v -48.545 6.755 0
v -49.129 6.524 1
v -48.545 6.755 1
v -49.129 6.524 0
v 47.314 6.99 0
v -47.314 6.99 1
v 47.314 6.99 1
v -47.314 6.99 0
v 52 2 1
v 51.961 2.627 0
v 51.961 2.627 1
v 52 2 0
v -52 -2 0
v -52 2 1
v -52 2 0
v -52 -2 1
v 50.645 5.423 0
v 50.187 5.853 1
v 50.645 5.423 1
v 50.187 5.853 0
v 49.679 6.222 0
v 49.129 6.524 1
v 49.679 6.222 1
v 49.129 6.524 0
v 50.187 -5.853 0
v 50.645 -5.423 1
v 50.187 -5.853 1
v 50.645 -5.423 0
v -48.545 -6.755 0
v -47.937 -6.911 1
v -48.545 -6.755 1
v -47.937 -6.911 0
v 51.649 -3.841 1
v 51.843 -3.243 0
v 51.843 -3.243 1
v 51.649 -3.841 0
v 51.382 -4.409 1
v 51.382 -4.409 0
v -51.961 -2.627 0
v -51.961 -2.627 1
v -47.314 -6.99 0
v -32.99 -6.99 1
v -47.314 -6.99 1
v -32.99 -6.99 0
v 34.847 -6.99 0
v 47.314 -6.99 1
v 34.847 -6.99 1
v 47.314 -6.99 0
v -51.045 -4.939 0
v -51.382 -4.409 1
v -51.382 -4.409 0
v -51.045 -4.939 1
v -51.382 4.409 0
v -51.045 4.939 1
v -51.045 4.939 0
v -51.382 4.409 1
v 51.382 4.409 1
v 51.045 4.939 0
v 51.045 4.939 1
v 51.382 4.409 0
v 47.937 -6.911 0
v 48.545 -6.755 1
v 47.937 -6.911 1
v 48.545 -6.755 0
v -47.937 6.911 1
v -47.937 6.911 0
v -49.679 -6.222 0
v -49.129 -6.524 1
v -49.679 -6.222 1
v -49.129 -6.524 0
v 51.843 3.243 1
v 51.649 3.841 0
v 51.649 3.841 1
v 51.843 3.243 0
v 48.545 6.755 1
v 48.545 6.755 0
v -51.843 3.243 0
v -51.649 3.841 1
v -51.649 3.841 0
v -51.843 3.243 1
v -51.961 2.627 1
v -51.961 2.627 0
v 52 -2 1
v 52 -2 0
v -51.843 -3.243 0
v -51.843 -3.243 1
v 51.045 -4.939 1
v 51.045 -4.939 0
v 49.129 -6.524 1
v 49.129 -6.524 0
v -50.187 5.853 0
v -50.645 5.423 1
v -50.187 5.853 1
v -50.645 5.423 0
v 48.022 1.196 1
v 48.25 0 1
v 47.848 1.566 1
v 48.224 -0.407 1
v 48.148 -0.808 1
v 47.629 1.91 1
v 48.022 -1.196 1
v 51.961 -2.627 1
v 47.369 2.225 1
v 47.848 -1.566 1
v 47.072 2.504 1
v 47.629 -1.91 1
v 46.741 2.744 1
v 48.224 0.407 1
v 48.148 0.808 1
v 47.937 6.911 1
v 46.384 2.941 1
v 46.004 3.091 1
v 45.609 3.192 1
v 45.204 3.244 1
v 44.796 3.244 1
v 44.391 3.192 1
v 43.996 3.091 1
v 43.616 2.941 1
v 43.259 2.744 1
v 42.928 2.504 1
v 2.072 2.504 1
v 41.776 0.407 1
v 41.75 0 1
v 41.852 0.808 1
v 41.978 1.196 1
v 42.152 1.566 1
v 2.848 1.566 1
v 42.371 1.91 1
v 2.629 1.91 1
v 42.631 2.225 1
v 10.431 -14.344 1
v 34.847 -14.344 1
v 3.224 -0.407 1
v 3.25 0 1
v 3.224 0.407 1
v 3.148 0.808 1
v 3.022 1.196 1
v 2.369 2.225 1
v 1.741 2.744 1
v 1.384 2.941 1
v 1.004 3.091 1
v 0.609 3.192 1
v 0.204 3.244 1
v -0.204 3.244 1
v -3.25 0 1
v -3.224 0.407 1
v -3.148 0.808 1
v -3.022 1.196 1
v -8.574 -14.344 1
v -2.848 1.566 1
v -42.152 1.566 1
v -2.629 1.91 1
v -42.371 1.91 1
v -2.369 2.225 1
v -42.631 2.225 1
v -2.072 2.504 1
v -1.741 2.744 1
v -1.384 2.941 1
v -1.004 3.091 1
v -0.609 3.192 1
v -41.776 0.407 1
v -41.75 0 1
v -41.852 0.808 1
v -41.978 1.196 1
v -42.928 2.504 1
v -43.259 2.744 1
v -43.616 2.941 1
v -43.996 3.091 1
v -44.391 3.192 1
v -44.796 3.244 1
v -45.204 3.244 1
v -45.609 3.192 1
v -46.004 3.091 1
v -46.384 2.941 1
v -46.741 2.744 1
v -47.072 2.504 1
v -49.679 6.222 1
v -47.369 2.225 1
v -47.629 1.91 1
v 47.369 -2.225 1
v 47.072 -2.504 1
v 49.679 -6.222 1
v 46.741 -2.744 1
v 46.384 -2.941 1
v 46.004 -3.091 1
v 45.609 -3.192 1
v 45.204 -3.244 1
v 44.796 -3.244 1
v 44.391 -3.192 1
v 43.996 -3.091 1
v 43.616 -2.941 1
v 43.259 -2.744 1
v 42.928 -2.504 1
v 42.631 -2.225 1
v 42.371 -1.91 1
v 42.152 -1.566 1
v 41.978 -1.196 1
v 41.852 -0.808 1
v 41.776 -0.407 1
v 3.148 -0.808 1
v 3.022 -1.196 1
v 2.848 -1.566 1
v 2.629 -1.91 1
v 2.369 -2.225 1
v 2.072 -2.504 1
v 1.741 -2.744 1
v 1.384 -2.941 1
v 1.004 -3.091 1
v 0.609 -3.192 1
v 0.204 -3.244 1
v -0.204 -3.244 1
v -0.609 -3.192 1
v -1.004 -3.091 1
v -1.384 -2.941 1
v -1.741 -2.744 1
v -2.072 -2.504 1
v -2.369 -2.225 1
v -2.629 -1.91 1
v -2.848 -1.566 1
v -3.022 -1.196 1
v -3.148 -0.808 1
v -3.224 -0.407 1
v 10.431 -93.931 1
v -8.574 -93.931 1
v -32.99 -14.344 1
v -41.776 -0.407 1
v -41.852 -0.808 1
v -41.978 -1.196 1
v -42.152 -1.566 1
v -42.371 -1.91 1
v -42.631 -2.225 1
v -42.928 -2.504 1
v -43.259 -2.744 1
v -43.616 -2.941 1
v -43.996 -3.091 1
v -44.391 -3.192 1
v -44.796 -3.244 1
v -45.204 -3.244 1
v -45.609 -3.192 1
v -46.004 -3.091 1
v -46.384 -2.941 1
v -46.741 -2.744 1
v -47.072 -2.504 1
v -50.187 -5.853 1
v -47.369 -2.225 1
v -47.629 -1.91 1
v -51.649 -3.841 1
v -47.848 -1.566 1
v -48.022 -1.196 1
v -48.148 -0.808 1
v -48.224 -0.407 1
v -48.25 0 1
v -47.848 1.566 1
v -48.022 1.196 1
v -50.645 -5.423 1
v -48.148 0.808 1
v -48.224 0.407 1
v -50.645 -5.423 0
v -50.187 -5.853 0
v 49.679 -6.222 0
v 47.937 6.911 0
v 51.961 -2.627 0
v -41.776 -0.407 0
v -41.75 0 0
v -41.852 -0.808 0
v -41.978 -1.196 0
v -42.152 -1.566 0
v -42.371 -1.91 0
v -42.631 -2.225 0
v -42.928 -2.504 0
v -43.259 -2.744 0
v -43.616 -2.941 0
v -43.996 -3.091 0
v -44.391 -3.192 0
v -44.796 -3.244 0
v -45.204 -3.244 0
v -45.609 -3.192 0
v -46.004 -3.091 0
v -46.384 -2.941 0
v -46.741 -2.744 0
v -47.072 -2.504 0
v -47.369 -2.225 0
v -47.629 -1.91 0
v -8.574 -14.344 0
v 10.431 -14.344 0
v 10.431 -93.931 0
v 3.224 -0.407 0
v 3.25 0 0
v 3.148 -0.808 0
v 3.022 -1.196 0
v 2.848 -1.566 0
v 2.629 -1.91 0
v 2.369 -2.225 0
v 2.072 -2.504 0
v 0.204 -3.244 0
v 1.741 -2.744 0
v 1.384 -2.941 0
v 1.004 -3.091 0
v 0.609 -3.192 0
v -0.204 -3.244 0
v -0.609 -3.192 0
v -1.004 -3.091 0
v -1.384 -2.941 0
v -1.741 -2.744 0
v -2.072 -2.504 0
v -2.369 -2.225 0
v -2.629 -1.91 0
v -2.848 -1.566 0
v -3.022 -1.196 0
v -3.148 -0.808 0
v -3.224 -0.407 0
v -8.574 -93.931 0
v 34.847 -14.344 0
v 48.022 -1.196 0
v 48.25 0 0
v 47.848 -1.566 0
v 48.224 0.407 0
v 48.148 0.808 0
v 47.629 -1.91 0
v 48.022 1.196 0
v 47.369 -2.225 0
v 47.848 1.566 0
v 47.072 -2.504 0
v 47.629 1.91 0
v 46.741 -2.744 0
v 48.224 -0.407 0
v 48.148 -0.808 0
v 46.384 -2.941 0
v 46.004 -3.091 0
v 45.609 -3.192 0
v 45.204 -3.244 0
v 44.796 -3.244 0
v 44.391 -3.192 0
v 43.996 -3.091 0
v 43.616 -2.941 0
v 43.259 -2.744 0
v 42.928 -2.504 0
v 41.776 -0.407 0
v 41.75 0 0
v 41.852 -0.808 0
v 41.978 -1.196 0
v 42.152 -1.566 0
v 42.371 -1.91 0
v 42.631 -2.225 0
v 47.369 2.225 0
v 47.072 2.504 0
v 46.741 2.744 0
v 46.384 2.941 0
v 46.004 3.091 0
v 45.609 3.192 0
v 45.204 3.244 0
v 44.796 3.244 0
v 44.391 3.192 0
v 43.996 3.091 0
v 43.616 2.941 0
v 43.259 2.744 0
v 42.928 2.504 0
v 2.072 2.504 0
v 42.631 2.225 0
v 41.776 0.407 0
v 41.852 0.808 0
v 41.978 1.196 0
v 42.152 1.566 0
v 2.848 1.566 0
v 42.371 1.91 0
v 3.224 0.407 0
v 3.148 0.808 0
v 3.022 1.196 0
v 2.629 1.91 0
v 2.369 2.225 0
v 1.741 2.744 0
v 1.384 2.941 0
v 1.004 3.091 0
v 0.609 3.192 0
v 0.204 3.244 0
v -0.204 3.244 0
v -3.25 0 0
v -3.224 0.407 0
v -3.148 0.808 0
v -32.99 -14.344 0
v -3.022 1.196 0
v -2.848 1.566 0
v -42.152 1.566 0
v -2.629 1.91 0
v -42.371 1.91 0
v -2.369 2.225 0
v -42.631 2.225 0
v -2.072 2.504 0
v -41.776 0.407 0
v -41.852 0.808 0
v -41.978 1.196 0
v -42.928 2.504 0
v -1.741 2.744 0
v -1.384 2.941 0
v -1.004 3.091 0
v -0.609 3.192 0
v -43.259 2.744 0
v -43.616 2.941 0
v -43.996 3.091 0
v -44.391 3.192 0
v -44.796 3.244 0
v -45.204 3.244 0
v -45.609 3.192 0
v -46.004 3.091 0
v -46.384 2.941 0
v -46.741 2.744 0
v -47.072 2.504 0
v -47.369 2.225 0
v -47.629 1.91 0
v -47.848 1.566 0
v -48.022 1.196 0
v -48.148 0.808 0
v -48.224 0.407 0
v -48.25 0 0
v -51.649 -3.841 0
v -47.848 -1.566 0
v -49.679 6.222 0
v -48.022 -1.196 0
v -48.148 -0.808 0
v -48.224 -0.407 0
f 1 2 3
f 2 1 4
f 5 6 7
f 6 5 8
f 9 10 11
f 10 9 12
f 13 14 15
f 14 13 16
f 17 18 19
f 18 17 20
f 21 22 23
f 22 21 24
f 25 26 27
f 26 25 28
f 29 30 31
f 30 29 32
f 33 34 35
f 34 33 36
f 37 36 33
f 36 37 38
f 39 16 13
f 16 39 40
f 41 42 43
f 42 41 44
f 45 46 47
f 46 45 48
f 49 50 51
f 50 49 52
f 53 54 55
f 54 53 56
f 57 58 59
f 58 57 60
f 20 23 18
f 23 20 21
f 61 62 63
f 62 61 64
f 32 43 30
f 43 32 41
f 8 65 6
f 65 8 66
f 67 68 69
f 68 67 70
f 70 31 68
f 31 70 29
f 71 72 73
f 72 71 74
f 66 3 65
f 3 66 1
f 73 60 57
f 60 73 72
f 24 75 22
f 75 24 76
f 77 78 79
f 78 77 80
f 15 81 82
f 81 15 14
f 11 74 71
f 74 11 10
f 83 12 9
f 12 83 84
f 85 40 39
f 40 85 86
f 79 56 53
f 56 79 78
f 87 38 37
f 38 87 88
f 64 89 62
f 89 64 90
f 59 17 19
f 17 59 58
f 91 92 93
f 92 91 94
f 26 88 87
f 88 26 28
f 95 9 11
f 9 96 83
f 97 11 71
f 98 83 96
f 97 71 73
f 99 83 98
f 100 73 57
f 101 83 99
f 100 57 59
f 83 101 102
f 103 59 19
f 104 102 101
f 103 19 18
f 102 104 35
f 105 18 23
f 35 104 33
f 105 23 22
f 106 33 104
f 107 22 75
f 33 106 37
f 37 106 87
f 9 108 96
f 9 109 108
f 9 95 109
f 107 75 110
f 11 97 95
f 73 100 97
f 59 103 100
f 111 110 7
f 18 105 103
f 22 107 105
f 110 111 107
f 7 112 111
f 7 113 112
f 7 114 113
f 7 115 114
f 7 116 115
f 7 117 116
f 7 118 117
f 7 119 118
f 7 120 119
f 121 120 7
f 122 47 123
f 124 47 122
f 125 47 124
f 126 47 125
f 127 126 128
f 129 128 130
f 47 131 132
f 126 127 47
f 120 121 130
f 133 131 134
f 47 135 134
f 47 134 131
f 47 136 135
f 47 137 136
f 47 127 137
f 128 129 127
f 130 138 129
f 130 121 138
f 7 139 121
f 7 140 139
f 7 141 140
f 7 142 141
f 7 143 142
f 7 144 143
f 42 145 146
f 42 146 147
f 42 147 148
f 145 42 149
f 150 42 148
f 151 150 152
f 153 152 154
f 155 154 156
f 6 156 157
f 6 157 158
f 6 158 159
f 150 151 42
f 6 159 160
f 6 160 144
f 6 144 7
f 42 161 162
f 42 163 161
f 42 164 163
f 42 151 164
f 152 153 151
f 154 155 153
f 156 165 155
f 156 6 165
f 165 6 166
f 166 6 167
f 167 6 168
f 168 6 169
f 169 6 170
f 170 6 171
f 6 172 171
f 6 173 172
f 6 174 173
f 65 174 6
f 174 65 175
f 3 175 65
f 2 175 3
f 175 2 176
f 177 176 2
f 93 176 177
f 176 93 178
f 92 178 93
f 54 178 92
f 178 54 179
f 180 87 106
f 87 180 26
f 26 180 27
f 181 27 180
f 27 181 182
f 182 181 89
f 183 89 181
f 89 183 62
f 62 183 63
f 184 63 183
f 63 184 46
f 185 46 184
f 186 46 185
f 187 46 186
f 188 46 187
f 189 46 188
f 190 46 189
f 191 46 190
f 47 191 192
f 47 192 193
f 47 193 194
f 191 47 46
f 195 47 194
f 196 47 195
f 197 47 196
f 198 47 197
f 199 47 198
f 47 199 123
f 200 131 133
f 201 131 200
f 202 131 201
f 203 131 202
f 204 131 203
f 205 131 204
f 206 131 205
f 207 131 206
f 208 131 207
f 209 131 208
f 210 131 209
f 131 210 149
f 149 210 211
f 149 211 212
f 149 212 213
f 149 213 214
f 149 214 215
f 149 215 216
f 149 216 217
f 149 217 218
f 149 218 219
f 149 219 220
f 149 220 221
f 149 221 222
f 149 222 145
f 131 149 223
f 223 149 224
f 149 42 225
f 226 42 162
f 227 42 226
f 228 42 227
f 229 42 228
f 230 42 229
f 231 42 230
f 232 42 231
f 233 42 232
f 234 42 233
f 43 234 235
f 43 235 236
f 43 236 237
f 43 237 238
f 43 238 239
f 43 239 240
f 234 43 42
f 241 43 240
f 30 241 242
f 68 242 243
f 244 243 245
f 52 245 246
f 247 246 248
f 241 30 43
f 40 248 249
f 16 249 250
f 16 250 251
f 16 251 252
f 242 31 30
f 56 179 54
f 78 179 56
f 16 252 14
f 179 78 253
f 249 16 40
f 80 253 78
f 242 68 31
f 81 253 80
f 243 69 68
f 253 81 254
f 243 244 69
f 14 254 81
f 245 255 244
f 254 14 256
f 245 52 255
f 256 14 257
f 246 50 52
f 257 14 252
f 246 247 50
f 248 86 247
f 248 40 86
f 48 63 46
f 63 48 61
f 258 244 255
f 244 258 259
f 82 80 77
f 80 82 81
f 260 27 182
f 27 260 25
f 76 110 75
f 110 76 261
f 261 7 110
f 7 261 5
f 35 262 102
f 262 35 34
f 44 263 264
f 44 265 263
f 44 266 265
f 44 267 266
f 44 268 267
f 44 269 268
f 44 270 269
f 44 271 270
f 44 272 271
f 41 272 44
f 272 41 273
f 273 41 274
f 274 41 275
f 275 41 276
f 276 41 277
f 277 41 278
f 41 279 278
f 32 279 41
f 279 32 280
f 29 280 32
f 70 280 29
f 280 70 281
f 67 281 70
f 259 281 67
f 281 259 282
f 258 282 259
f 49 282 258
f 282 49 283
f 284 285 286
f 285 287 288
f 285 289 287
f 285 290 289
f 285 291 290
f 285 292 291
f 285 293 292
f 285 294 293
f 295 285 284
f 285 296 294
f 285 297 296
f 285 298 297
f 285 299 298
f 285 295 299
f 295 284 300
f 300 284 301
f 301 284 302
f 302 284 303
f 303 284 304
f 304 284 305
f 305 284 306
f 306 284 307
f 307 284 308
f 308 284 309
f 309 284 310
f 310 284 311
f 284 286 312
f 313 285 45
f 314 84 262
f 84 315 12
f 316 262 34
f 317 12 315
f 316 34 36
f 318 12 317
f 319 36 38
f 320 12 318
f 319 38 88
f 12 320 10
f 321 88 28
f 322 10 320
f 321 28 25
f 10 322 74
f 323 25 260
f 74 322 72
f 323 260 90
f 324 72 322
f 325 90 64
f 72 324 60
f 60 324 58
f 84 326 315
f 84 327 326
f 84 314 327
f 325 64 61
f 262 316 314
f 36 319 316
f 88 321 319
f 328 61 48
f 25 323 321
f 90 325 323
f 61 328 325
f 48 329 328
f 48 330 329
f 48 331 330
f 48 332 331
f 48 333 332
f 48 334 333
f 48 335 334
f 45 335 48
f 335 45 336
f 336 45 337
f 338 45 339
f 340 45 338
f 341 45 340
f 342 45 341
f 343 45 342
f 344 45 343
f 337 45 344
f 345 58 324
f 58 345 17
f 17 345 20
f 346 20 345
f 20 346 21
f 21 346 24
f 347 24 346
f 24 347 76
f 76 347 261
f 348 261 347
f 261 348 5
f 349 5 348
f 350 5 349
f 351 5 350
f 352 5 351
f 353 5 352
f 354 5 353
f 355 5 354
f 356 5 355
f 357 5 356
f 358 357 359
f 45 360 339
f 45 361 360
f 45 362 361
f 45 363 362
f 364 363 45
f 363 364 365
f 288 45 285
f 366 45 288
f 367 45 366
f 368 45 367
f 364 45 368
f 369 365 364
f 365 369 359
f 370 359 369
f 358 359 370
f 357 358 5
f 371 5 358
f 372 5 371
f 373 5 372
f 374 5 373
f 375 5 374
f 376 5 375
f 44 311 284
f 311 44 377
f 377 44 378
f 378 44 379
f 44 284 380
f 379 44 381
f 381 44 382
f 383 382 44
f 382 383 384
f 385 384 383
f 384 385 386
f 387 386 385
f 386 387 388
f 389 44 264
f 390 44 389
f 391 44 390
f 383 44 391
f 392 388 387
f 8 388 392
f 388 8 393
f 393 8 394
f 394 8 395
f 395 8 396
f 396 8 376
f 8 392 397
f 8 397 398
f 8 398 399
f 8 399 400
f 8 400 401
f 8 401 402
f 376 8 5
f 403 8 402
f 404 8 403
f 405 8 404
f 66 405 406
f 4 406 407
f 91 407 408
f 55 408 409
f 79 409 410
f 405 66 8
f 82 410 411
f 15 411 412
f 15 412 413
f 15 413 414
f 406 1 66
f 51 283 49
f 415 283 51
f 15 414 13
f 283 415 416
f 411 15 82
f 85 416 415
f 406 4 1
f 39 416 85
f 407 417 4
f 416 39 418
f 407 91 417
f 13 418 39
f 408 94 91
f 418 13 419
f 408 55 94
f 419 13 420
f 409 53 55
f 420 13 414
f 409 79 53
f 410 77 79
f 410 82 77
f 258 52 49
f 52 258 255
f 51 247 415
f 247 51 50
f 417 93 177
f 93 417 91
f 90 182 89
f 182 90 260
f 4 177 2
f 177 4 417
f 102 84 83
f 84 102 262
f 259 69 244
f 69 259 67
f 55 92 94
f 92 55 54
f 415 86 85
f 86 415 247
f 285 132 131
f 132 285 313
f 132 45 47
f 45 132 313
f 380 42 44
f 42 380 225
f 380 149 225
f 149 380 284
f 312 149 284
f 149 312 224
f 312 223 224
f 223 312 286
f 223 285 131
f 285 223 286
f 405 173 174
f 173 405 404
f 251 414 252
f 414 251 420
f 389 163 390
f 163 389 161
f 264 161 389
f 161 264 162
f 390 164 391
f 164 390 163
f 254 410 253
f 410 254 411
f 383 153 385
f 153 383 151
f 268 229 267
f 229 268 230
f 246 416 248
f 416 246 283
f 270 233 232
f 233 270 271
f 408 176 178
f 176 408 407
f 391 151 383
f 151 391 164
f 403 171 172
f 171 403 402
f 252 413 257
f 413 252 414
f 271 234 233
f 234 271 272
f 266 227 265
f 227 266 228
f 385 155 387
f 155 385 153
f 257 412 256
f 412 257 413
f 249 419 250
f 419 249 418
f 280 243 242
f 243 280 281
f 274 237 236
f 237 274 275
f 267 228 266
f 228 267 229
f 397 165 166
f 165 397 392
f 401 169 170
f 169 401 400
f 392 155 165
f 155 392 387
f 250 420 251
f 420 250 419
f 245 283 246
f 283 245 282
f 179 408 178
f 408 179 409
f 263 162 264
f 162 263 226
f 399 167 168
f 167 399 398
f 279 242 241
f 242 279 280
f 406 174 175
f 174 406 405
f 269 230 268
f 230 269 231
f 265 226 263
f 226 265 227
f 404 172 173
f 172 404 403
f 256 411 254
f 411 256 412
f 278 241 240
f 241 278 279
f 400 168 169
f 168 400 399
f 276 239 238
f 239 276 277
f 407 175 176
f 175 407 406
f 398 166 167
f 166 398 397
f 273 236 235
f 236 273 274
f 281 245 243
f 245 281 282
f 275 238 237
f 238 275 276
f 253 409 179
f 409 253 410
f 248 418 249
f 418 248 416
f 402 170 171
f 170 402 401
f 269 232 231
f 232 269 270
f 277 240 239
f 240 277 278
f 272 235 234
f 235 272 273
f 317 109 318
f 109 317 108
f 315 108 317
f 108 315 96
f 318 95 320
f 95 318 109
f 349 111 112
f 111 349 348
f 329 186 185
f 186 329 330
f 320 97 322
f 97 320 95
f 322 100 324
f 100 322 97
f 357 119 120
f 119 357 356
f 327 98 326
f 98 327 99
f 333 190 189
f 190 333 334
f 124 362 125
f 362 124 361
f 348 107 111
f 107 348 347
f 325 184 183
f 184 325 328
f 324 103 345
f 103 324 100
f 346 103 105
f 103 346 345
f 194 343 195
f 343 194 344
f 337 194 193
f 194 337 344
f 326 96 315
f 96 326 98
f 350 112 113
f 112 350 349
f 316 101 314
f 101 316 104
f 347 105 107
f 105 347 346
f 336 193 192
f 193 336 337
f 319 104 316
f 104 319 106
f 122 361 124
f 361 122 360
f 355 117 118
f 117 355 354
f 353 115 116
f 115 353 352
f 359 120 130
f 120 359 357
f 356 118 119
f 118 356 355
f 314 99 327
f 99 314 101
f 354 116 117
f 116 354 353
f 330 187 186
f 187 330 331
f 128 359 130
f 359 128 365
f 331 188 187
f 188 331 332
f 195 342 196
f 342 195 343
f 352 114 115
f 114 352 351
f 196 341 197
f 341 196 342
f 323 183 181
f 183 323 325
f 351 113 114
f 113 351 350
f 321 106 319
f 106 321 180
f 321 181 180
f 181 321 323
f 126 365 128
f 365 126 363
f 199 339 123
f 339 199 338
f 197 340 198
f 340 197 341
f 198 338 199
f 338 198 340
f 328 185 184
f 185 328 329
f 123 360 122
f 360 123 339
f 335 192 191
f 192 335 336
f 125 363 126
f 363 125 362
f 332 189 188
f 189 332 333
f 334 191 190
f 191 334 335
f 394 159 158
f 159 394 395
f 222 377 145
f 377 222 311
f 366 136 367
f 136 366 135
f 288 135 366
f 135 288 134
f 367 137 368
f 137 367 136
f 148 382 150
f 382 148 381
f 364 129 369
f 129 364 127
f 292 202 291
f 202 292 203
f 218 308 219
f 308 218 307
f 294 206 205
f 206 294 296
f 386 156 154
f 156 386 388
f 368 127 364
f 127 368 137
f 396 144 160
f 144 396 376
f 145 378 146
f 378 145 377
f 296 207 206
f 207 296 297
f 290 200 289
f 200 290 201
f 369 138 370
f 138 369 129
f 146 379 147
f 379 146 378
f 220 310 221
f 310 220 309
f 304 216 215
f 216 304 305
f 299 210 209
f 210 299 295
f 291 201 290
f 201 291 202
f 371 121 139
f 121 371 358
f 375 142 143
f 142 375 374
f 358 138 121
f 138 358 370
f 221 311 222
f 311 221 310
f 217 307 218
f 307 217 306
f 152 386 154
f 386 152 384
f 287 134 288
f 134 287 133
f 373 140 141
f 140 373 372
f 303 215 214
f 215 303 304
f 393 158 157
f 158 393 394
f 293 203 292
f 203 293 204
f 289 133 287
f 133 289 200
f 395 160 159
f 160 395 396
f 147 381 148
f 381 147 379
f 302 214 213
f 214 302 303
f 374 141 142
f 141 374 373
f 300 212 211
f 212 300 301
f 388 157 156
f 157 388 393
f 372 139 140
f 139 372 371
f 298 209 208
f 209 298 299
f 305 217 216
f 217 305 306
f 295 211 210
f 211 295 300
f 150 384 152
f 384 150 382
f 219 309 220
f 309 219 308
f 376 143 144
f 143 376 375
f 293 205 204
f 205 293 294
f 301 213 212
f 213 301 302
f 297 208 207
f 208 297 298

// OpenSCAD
$fn = 50;


difference() {
	union() {
		translate(v = [0, 0, 0]) {
			rotate(a = [0, 0, 0]) {
				hull() {
					translate(v = [-47.0000000000, 2.0000000000, 0]) {
						rotate(a = [0, 0, 0]) {
							translate(v = [0, 0, 0]) {
								rotate(a = [0, 0, 0]) {
									cylinder(h = 1, r = 5);
								}
							}
						}
					}
					translate(v = [47.0000000000, 2.0000000000, 0]) {
						rotate(a = [0, 0, 0]) {
							translate(v = [0, 0, 0]) {
								rotate(a = [0, 0, 0]) {
									cylinder(h = 1, r = 5);
								}
							}
						}
					}
					translate(v = [-47.0000000000, -2.0000000000, 0]) {
						rotate(a = [0, 0, 0]) {
							translate(v = [0, 0, 0]) {
								rotate(a = [0, 0, 0]) {
									cylinder(h = 1, r = 5);
								}
							}
						}
					}
					translate(v = [47.0000000000, -2.0000000000, 0]) {
						rotate(a = [0, 0, 0]) {
							translate(v = [0, 0, 0]) {
								rotate(a = [0, 0, 0]) {
									cylinder(h = 1, r = 5);
								}
							}
						}
					}
				}
			}
		}
		translate(v = [0, 0, 0]) {
			rotate(a = [0, 0, 0]) {
				linear_extrude(height = 1) {
					text(font = "DejaVu Sans Mono:style=Bold", halign = "center", size = 95.0000000000, text = "T", valign = "top");
				}
			}
		}
	}
	union() {
		translate(v = [-45.0000000000, 0.0000000000, -125.0000000000]) {
			rotate(a = [0, 0, 0]) {
				cylinder(h = 250, r = 3.2500000000);
			}
		}
		translate(v = [45.0000000000, 0.0000000000, -125.0000000000]) {
			rotate(a = [0, 0, 0]) {
				cylinder(h = 250, r = 3.2500000000);
			}
		}
		translate(v = [45.0000000000, 0.0000000000, -125.0000000000]) {
			rotate(a = [0, 0, 0]) {
				cylinder(h = 250, r = 3.2500000000);
			}
		}
		translate(v = [0, 0, -125.0000000000]) {
			rotate(a = [0, 0, 0]) {
				cylinder(h = 250, r = 3.2500000000);
			}
		}
	}
}
